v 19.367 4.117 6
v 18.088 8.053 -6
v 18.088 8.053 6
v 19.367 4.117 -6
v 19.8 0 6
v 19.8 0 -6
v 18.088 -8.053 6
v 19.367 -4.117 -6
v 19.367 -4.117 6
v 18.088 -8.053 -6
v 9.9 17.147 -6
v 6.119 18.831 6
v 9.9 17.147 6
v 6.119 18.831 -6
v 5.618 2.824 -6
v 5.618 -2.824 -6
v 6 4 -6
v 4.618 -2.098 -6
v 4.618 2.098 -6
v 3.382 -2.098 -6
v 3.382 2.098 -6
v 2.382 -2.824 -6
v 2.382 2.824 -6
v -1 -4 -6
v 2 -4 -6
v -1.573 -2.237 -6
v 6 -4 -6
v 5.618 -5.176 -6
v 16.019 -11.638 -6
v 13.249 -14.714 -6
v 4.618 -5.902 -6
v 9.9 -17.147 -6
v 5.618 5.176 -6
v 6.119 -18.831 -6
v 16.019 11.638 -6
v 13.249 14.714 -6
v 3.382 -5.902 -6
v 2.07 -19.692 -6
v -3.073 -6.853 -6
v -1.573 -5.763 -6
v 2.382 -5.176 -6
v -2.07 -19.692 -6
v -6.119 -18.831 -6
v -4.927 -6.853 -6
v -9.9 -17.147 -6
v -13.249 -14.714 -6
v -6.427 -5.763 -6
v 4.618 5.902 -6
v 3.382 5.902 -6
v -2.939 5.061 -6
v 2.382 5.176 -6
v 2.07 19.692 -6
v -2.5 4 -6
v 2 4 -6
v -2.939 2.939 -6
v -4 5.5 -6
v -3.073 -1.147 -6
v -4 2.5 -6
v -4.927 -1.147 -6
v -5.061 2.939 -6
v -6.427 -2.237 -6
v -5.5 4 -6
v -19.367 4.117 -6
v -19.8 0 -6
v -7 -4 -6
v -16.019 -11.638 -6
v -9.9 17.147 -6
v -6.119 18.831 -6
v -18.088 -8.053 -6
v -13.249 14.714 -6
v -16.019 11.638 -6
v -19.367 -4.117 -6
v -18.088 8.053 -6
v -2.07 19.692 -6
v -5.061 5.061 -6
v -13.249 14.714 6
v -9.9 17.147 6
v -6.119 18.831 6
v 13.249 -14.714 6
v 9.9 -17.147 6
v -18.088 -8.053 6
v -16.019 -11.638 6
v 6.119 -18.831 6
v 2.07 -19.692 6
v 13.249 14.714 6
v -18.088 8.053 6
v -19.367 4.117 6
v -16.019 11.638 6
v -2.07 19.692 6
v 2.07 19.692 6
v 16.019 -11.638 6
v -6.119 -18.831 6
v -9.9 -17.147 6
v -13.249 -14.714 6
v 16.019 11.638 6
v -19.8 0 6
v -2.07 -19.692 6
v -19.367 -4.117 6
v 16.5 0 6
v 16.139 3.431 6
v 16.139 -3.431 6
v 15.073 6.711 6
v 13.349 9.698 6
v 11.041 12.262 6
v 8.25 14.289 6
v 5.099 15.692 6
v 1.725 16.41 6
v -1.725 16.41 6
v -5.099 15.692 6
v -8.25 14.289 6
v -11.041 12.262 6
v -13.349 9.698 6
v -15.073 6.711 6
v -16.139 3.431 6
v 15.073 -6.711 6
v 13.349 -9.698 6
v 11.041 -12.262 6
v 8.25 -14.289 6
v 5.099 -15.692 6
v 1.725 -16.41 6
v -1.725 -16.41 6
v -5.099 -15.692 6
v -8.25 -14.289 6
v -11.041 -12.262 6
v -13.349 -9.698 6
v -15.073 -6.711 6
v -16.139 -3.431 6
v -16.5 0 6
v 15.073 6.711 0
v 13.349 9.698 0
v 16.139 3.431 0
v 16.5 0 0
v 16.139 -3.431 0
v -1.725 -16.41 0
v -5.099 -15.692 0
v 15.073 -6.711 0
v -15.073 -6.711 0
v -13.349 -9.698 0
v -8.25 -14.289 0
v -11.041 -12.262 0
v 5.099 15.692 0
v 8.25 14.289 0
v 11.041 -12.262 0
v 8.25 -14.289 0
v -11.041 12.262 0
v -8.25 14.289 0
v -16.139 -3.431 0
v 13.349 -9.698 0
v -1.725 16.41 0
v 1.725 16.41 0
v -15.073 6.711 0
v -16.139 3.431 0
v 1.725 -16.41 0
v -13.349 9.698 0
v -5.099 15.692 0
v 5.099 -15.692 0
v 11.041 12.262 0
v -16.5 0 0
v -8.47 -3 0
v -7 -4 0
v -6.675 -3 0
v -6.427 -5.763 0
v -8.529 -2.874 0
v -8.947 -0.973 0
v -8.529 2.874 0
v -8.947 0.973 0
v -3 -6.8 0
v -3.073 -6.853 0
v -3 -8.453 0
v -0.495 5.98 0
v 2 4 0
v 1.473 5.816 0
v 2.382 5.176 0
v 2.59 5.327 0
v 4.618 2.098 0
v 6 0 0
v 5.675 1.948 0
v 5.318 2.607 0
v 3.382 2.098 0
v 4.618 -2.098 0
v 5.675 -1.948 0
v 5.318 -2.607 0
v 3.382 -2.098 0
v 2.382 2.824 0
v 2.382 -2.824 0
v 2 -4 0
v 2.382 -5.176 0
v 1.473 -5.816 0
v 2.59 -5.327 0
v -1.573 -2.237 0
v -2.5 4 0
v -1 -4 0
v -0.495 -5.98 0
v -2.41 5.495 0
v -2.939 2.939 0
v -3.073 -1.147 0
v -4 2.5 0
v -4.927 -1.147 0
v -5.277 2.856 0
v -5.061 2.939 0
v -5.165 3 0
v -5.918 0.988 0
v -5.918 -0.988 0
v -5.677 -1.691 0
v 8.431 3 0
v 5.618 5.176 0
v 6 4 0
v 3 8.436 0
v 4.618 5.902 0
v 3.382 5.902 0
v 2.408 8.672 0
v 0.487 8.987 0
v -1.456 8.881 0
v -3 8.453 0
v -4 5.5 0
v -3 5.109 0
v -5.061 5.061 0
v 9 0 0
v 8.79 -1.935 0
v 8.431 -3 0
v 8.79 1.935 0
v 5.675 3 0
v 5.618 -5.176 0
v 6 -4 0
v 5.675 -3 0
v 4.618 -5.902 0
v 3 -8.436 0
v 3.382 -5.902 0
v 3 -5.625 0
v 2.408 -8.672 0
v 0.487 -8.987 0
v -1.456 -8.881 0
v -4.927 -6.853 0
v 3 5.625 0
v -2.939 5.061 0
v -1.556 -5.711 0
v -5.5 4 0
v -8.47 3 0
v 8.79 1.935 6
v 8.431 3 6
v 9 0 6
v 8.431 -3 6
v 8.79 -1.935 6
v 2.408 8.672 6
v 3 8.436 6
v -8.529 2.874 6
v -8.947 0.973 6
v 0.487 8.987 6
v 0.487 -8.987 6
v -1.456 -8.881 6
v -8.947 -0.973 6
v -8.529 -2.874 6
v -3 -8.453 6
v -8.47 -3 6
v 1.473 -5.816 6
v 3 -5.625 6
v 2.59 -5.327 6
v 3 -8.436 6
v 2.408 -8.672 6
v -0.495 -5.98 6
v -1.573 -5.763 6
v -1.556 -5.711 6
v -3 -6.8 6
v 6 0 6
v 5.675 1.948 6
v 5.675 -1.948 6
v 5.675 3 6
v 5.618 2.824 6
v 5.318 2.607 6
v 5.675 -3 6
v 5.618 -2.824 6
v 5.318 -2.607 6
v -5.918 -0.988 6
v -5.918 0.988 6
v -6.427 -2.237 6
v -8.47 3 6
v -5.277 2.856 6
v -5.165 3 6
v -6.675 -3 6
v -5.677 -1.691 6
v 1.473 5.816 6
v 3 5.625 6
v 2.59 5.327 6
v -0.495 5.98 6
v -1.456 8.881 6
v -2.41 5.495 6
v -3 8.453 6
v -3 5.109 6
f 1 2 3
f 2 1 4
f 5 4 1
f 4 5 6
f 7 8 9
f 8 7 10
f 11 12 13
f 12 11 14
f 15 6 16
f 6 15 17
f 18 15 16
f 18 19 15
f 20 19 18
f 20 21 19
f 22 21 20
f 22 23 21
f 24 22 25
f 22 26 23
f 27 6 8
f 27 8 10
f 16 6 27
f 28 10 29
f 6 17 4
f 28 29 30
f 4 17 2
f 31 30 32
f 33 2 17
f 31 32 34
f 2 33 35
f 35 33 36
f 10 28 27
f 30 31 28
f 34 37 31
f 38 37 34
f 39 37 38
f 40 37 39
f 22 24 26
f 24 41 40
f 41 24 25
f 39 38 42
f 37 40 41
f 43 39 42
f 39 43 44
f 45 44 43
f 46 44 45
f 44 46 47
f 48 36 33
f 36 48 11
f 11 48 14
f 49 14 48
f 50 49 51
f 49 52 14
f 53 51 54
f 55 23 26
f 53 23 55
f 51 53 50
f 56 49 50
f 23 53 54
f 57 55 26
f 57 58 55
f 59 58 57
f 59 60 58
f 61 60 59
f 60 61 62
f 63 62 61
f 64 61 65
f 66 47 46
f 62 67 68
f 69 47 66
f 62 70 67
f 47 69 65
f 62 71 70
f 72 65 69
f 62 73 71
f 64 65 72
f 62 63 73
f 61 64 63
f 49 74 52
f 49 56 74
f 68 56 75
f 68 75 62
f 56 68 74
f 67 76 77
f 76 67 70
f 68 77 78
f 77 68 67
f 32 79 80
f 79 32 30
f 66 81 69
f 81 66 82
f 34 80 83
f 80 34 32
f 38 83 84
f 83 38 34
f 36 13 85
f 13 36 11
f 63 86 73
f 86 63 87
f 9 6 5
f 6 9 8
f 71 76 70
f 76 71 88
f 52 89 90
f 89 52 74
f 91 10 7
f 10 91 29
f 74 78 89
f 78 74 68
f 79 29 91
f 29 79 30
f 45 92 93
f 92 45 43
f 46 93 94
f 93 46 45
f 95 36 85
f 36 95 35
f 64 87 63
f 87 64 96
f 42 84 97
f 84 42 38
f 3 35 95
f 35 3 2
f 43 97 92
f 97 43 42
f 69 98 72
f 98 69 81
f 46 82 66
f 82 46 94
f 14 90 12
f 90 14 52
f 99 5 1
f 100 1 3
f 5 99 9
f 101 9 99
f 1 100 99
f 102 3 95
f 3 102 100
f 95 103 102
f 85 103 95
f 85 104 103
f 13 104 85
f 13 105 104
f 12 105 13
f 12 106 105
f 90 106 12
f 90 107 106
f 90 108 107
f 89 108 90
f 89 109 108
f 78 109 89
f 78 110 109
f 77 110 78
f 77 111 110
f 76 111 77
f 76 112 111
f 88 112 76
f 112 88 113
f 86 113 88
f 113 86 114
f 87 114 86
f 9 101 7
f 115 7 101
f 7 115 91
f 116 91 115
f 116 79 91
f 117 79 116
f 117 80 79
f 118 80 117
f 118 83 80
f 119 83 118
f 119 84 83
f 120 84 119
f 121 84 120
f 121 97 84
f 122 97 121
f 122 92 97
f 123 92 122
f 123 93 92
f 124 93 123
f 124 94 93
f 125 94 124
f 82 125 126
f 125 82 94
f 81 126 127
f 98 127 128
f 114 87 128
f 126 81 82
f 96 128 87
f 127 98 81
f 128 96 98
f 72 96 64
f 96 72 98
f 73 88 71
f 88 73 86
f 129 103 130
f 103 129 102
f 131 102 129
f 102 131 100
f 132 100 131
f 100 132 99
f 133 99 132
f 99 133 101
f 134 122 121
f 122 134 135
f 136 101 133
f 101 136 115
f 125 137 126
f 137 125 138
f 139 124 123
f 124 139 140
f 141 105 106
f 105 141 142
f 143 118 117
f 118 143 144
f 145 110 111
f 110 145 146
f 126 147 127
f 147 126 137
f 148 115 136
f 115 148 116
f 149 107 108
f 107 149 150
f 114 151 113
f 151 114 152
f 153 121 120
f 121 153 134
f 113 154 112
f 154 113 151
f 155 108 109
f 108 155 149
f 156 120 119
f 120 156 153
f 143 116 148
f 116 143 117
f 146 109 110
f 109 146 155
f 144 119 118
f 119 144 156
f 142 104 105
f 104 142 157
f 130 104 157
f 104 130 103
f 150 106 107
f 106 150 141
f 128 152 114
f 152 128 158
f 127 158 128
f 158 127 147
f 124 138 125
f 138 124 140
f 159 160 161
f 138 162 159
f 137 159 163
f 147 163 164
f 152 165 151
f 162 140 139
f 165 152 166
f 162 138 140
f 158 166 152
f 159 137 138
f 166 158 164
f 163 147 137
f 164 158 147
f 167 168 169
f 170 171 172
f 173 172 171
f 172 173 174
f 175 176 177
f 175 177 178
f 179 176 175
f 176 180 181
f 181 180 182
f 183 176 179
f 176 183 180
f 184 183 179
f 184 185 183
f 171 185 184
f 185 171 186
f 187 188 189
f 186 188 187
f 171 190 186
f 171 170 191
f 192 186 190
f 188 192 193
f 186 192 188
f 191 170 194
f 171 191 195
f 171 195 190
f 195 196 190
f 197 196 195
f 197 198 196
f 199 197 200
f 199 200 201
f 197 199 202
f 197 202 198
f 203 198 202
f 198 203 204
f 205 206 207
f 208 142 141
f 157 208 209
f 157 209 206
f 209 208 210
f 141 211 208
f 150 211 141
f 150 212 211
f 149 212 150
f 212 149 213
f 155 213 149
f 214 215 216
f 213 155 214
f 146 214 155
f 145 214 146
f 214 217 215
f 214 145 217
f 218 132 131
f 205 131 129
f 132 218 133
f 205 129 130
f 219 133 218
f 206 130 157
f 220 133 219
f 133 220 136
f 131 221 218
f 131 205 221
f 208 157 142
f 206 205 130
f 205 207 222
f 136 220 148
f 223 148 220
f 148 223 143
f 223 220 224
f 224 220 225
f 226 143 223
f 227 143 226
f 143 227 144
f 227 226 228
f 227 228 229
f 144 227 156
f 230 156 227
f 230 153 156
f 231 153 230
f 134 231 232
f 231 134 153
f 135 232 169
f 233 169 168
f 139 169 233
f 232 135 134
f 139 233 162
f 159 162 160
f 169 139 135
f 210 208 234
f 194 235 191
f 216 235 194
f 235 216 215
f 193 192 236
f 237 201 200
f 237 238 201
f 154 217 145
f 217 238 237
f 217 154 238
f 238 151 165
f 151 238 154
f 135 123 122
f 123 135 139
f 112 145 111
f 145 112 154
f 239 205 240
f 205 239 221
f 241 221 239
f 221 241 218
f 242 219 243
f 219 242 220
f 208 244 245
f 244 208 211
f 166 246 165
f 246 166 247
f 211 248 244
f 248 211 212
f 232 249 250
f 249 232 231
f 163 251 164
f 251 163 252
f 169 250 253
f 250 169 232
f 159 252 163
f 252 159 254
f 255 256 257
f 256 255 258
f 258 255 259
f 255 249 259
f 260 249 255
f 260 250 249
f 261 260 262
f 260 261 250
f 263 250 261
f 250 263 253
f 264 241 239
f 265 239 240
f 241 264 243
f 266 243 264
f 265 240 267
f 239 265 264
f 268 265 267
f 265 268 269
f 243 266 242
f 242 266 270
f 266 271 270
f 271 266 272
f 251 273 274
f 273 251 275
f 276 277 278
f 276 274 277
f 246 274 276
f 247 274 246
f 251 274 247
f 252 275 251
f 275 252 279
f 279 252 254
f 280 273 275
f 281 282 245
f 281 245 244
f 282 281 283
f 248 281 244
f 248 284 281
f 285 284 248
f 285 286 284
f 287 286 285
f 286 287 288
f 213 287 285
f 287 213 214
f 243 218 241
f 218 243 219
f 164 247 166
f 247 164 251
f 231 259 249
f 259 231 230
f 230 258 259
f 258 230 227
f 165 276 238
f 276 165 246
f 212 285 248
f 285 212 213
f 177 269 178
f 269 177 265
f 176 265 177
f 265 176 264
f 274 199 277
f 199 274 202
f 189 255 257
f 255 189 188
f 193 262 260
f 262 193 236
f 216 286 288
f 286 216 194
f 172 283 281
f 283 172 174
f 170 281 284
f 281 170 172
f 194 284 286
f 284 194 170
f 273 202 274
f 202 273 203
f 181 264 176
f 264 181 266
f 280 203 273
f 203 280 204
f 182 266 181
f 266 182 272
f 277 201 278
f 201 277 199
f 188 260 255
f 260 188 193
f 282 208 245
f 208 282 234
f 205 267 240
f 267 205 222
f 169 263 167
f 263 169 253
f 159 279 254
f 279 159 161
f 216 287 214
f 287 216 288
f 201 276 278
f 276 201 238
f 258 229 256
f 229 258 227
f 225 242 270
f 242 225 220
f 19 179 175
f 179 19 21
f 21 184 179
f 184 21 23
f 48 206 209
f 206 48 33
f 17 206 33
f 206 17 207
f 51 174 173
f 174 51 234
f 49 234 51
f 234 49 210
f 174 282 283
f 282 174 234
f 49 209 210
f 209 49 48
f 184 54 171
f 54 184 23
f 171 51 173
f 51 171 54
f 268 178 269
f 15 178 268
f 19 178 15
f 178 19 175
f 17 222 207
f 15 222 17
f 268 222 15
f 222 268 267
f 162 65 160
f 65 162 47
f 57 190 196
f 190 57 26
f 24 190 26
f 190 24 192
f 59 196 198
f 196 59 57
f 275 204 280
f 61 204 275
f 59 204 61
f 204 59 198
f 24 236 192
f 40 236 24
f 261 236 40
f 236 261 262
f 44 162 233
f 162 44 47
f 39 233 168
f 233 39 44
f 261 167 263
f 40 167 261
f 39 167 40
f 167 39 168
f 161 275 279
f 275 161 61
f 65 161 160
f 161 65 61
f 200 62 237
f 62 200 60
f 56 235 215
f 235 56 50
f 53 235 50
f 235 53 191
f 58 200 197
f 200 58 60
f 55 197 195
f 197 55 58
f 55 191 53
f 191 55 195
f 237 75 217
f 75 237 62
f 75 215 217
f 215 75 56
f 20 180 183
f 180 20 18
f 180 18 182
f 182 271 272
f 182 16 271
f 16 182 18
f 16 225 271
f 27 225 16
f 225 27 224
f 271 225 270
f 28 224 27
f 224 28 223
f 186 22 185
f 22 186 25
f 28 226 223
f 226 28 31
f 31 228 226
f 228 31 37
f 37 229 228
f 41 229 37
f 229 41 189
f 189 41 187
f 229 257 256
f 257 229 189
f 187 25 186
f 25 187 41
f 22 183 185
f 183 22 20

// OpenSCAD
insideradius = 9;
outsideradius = 16.5;
height = 12;
inletradius = 2;
filterradius= 3;
inducerradius = 1.5;
sampleradius = 2;
c0 = 14;
t0 = 10;  // tab spacing
tt = 3;   // tab thickness
i0 = 4;  //inlet spacing

module base(size) {

    difference() {
     cylinder(r=outsideradius+(outsideradius/5),
            h=size,center=true);
     translate([0,0,size/2])
        cylinder(r=outsideradius,h=size,center=true);
    } 
}
module tabs(size) {
    difference() {
     cylinder(r=insideradius,h=size,center=true);
     translate([0,0,size/2])
        cylinder(r=insideradius-tt,h=size,center=true);
     translate([t0,t0,0])
		    cube([c0,c0,height+2],center=true);
     translate([-t0,-t0,0])
		    cube([c0,c0,height+2],center=true);
     translate([-t0,t0,0])
		    cube([c0,c0,height+2],center=true);
     translate([t0,-t0,0])
		    cube([c0,c0,height+2],center=true);
    } 
}
module cap() {
	base(height);
 // rotate([0,0,45])
    tabs(height);
}
module septa() {
     difference() {
        cap();
        translate([i0,i0,0])
			      cylinder(r=inletradius,h=30,center=true,$fn=10);
        translate([-i0,-i0,0])
			      cylinder(r=filterradius,h=30,center=true);
        translate([-i0,i0,0])
			      cylinder(r=inducerradius,h=30,center=true,$fn=8);
        translate([i0,-i0,0])
			      cylinder(r=sampleradius,h=30,center=true,$fn=10);

     }
}
septa();
